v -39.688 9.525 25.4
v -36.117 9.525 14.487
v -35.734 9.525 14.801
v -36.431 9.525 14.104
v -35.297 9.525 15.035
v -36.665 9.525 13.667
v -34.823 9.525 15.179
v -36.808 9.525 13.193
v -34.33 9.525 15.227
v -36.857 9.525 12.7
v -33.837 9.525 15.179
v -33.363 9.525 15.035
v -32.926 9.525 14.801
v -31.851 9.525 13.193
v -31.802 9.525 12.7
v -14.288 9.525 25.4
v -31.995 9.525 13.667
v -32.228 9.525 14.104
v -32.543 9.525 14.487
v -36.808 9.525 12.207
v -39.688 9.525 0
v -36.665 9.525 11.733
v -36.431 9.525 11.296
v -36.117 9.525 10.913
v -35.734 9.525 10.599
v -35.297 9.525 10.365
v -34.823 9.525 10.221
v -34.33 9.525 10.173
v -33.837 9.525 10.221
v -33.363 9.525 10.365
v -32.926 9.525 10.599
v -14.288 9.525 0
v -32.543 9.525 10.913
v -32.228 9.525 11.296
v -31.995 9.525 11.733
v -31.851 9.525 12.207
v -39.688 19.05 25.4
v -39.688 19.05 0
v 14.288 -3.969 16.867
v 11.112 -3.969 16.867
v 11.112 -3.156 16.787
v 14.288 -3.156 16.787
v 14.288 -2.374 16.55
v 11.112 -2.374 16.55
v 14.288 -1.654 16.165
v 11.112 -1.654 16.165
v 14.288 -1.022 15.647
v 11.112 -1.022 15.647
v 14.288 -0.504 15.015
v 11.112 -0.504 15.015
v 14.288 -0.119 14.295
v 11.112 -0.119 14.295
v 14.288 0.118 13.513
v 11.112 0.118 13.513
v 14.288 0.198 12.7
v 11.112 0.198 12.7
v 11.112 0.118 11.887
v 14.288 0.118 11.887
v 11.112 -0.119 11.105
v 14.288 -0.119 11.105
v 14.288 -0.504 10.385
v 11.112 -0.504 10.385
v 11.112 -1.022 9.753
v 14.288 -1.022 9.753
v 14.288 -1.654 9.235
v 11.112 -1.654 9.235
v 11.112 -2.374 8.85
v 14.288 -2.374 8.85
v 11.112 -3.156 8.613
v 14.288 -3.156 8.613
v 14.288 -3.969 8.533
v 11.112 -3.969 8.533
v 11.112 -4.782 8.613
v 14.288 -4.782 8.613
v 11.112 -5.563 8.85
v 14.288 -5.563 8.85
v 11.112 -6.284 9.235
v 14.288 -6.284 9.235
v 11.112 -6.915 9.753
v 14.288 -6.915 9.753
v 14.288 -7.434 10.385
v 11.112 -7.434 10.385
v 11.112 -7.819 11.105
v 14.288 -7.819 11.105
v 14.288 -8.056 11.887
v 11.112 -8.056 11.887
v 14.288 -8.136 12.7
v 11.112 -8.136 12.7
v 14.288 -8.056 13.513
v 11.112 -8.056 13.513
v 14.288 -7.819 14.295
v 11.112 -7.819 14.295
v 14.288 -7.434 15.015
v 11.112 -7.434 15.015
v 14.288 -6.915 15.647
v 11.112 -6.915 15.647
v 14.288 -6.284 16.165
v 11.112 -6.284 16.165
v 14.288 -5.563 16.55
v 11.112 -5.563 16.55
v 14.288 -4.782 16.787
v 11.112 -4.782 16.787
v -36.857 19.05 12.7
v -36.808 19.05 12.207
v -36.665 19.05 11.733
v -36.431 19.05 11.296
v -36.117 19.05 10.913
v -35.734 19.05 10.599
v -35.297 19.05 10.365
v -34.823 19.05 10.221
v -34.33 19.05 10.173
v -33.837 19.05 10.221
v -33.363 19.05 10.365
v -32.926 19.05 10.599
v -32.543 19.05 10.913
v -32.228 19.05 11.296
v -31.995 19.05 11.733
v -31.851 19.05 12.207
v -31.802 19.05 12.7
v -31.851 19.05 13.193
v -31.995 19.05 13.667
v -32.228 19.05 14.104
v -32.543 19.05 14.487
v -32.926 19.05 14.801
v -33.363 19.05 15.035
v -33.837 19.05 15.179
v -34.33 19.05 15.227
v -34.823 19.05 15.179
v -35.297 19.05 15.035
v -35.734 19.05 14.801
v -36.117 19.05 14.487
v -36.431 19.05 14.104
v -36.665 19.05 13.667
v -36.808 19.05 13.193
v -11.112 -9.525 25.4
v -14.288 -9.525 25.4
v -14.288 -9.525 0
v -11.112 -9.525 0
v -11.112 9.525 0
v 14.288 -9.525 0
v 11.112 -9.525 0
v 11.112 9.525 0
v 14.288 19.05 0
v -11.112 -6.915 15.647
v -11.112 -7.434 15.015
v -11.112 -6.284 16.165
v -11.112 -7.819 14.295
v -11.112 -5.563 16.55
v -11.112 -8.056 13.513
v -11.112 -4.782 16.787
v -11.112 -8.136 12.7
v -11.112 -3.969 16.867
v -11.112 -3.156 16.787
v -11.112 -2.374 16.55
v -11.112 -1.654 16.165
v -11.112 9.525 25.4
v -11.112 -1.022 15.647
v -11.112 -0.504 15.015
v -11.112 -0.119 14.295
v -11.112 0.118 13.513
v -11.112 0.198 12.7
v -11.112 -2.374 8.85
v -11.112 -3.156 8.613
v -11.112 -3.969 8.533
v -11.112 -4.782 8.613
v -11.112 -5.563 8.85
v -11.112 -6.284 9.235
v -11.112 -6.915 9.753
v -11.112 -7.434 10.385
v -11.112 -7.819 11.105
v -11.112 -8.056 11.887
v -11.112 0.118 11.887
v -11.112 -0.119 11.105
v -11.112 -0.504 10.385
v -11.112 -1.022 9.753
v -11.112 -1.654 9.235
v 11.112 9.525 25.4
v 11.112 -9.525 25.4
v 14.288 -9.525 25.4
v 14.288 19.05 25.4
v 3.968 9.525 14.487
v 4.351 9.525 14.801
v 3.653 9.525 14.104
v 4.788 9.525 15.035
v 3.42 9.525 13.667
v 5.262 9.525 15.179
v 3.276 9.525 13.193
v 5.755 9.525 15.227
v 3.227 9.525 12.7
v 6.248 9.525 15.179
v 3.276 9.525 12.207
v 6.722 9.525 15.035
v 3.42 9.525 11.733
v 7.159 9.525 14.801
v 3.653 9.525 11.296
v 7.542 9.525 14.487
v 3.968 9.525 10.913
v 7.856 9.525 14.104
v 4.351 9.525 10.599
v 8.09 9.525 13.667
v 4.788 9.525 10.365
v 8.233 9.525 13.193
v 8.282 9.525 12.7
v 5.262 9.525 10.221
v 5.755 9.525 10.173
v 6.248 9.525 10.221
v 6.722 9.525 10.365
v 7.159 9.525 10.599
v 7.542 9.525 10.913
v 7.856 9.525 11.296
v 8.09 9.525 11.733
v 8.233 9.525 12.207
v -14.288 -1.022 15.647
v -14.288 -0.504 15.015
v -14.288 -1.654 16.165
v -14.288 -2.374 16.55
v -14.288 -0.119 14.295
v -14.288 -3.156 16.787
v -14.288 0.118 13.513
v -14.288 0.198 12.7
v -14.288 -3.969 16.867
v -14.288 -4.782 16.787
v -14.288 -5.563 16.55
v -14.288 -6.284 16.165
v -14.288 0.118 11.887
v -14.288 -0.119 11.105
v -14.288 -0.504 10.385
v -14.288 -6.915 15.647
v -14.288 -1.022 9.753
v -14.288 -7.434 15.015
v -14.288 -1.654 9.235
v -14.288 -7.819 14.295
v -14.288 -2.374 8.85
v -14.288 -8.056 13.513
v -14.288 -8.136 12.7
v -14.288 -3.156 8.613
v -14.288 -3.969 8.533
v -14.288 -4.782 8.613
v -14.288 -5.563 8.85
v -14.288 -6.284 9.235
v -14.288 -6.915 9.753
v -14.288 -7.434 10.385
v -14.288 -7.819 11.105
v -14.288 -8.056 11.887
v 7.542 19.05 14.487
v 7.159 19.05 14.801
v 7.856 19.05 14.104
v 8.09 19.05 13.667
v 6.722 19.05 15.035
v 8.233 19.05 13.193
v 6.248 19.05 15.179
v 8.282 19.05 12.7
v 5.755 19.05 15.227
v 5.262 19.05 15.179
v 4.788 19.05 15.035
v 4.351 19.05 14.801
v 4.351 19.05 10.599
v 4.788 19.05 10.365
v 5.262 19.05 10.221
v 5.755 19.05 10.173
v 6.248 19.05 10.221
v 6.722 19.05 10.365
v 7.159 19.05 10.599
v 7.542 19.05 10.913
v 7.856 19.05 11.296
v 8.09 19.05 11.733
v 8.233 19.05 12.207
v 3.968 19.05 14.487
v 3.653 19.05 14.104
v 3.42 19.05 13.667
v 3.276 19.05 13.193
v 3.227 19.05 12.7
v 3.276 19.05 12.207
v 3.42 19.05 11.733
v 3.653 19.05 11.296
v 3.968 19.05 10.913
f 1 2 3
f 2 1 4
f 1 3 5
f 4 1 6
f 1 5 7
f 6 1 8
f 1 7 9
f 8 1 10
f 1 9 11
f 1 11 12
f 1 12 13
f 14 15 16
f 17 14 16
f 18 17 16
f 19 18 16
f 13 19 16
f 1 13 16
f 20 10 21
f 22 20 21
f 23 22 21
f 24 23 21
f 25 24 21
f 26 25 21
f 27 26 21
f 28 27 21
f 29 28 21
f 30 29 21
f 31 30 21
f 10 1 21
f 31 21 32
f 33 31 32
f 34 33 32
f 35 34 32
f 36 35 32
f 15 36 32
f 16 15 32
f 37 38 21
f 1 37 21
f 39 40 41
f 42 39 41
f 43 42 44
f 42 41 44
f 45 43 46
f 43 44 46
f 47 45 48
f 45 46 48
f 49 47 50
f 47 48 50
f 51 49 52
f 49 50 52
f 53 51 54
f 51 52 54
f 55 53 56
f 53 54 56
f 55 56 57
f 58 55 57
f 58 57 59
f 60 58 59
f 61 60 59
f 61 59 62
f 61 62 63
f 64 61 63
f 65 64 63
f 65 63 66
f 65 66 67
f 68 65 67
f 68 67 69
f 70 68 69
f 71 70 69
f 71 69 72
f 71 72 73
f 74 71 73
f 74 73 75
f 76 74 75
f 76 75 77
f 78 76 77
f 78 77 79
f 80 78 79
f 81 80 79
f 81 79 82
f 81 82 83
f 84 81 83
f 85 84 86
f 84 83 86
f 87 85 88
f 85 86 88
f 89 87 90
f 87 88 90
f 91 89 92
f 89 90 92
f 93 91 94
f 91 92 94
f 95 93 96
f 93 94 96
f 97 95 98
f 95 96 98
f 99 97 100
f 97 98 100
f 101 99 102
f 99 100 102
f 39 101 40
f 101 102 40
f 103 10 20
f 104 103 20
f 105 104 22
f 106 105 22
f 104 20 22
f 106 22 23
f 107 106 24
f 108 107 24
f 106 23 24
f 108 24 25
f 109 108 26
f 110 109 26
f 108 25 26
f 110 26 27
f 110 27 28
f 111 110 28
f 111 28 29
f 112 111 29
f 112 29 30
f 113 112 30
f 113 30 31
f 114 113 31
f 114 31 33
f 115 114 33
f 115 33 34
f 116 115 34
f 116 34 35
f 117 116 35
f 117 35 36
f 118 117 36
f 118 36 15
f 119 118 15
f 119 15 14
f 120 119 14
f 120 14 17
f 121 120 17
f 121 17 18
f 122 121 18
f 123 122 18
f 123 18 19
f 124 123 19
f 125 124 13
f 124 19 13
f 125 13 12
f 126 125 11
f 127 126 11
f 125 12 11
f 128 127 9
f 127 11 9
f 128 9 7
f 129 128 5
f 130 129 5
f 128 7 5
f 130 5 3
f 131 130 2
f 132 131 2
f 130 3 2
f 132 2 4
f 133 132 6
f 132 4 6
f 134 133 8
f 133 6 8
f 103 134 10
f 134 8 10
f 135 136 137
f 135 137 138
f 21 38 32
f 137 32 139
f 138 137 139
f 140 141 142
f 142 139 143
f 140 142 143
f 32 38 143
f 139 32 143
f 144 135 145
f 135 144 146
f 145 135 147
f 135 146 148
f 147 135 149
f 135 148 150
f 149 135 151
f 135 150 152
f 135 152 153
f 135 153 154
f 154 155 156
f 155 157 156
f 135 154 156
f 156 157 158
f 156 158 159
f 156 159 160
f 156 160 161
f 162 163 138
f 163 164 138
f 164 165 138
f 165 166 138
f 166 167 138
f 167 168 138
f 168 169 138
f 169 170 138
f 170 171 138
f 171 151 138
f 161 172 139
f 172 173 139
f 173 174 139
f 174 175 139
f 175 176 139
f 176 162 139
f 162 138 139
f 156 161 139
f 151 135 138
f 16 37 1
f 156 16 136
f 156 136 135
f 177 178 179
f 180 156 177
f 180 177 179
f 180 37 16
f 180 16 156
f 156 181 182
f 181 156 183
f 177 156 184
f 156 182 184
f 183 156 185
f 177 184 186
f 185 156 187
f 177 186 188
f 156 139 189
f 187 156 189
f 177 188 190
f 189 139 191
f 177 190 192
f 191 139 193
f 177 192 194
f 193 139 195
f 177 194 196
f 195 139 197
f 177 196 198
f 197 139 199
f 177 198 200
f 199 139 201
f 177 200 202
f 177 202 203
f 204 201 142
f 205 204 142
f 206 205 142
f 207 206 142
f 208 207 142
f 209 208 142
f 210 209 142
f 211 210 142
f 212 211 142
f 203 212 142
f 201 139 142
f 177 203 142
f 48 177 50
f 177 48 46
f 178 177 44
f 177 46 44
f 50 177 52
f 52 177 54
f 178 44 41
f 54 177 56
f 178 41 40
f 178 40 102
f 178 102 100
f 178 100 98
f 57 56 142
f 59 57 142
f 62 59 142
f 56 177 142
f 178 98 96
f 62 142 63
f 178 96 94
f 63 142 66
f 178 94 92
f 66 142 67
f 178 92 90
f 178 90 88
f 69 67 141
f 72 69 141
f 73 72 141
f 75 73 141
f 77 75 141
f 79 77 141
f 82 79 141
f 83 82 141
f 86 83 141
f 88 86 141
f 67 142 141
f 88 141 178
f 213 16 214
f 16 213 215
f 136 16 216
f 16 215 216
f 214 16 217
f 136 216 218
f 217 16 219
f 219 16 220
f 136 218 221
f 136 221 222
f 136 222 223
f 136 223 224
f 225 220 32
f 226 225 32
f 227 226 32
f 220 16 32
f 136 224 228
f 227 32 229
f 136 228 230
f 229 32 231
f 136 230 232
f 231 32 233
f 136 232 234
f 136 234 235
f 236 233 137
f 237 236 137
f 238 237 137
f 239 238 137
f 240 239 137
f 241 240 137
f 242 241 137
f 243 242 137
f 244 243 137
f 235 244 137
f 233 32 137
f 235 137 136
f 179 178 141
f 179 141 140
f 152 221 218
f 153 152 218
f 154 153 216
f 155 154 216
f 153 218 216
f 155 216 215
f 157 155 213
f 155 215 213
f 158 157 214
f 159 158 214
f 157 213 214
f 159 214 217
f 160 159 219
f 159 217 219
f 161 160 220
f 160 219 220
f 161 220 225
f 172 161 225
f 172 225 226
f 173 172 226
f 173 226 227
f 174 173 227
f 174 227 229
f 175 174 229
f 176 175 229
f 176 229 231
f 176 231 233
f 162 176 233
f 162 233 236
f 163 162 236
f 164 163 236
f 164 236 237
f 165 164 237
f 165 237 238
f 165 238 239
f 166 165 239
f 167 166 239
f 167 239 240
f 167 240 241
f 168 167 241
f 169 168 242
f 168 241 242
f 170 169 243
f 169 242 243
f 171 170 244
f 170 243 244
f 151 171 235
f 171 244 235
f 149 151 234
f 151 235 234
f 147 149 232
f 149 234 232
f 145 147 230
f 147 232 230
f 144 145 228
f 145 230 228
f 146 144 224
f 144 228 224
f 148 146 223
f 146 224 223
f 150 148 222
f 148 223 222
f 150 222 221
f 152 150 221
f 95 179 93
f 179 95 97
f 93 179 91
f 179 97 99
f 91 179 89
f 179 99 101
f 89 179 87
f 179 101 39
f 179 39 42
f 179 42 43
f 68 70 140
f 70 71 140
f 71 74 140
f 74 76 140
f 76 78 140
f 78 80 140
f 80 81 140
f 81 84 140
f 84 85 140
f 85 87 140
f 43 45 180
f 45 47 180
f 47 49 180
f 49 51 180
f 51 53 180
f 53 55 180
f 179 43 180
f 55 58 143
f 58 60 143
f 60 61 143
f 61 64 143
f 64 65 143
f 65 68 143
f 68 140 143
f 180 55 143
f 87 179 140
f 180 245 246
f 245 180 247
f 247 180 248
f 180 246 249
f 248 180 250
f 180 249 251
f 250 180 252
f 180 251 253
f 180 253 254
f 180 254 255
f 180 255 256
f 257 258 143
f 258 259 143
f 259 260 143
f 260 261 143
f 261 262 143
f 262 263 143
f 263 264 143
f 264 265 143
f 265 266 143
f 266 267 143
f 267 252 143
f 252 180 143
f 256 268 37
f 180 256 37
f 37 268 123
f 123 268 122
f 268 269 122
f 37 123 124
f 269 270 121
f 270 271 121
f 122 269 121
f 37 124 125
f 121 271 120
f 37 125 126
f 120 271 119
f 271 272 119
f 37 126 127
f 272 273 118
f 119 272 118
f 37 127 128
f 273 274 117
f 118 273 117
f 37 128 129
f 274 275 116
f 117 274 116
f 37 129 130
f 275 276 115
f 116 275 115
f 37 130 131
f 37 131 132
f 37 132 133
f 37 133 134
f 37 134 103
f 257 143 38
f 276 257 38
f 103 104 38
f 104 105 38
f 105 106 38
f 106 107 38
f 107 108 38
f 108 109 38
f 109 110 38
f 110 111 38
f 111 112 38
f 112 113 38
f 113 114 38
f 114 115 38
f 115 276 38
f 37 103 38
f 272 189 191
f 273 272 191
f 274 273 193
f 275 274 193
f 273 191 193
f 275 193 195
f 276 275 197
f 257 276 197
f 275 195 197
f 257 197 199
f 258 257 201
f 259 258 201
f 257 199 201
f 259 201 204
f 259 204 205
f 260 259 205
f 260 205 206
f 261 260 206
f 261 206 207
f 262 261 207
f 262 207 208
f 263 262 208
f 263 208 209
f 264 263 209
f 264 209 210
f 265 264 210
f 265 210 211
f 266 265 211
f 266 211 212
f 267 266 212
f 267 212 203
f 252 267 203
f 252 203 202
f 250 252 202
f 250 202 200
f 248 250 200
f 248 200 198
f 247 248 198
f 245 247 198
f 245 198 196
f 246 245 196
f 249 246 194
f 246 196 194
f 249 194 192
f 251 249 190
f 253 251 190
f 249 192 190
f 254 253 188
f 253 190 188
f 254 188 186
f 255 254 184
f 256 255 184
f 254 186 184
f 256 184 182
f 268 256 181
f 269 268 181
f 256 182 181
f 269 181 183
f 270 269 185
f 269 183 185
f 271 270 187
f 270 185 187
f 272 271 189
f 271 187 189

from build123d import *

# Parameters (mm, degrees)
BOSS_EXTRUDE1_DEPTH        = 25.4
SKETCH2_R                  = 4.1671875
CUT_EXTRUDE1_DEPTH         = 43.715256349
F_8_0_199_DIAMETER_HOLE1_D = 5.0546


with BuildPart() as part:
    # Sketch1 → Boss-Extrude1 (new body)
    with BuildSketch(Plane.XY):
        Polygon((-14.2875, 9.525), (-14.2875, -9.525), (-11.1125, -9.525), (-11.1125, 9.525), (11.1125, 9.525), (11.1125, -9.525), (14.2875, -9.525), (14.2875, 19.05), (-39.6875, 19.05), (-39.6875, 9.525), align=None)
    extrude(amount=BOSS_EXTRUDE1_DEPTH)

    # Sketch2 → Cut-Extrude1 (cut, through all)
    with BuildSketch(Plane.ZY.offset(14.2875)):
        with Locations((12.7, -3.96875)):
            Circle(SKETCH2_R)
    extrude(amount=-CUT_EXTRUDE1_DEPTH, mode=Mode.SUBTRACT)

    # #8 (0.199) Diameter Hole1 (through all)
    with Locations(Plane(origin=(0, 19.05, 0), x_dir=(1, 0, 0), z_dir=(0, 1, 0))):
        with Locations((-34.3296875, -12.7), (5.7546875, -12.7)):
            Hole(F_8_0_199_DIAMETER_HOLE1_D / 2)


solid = part.part
